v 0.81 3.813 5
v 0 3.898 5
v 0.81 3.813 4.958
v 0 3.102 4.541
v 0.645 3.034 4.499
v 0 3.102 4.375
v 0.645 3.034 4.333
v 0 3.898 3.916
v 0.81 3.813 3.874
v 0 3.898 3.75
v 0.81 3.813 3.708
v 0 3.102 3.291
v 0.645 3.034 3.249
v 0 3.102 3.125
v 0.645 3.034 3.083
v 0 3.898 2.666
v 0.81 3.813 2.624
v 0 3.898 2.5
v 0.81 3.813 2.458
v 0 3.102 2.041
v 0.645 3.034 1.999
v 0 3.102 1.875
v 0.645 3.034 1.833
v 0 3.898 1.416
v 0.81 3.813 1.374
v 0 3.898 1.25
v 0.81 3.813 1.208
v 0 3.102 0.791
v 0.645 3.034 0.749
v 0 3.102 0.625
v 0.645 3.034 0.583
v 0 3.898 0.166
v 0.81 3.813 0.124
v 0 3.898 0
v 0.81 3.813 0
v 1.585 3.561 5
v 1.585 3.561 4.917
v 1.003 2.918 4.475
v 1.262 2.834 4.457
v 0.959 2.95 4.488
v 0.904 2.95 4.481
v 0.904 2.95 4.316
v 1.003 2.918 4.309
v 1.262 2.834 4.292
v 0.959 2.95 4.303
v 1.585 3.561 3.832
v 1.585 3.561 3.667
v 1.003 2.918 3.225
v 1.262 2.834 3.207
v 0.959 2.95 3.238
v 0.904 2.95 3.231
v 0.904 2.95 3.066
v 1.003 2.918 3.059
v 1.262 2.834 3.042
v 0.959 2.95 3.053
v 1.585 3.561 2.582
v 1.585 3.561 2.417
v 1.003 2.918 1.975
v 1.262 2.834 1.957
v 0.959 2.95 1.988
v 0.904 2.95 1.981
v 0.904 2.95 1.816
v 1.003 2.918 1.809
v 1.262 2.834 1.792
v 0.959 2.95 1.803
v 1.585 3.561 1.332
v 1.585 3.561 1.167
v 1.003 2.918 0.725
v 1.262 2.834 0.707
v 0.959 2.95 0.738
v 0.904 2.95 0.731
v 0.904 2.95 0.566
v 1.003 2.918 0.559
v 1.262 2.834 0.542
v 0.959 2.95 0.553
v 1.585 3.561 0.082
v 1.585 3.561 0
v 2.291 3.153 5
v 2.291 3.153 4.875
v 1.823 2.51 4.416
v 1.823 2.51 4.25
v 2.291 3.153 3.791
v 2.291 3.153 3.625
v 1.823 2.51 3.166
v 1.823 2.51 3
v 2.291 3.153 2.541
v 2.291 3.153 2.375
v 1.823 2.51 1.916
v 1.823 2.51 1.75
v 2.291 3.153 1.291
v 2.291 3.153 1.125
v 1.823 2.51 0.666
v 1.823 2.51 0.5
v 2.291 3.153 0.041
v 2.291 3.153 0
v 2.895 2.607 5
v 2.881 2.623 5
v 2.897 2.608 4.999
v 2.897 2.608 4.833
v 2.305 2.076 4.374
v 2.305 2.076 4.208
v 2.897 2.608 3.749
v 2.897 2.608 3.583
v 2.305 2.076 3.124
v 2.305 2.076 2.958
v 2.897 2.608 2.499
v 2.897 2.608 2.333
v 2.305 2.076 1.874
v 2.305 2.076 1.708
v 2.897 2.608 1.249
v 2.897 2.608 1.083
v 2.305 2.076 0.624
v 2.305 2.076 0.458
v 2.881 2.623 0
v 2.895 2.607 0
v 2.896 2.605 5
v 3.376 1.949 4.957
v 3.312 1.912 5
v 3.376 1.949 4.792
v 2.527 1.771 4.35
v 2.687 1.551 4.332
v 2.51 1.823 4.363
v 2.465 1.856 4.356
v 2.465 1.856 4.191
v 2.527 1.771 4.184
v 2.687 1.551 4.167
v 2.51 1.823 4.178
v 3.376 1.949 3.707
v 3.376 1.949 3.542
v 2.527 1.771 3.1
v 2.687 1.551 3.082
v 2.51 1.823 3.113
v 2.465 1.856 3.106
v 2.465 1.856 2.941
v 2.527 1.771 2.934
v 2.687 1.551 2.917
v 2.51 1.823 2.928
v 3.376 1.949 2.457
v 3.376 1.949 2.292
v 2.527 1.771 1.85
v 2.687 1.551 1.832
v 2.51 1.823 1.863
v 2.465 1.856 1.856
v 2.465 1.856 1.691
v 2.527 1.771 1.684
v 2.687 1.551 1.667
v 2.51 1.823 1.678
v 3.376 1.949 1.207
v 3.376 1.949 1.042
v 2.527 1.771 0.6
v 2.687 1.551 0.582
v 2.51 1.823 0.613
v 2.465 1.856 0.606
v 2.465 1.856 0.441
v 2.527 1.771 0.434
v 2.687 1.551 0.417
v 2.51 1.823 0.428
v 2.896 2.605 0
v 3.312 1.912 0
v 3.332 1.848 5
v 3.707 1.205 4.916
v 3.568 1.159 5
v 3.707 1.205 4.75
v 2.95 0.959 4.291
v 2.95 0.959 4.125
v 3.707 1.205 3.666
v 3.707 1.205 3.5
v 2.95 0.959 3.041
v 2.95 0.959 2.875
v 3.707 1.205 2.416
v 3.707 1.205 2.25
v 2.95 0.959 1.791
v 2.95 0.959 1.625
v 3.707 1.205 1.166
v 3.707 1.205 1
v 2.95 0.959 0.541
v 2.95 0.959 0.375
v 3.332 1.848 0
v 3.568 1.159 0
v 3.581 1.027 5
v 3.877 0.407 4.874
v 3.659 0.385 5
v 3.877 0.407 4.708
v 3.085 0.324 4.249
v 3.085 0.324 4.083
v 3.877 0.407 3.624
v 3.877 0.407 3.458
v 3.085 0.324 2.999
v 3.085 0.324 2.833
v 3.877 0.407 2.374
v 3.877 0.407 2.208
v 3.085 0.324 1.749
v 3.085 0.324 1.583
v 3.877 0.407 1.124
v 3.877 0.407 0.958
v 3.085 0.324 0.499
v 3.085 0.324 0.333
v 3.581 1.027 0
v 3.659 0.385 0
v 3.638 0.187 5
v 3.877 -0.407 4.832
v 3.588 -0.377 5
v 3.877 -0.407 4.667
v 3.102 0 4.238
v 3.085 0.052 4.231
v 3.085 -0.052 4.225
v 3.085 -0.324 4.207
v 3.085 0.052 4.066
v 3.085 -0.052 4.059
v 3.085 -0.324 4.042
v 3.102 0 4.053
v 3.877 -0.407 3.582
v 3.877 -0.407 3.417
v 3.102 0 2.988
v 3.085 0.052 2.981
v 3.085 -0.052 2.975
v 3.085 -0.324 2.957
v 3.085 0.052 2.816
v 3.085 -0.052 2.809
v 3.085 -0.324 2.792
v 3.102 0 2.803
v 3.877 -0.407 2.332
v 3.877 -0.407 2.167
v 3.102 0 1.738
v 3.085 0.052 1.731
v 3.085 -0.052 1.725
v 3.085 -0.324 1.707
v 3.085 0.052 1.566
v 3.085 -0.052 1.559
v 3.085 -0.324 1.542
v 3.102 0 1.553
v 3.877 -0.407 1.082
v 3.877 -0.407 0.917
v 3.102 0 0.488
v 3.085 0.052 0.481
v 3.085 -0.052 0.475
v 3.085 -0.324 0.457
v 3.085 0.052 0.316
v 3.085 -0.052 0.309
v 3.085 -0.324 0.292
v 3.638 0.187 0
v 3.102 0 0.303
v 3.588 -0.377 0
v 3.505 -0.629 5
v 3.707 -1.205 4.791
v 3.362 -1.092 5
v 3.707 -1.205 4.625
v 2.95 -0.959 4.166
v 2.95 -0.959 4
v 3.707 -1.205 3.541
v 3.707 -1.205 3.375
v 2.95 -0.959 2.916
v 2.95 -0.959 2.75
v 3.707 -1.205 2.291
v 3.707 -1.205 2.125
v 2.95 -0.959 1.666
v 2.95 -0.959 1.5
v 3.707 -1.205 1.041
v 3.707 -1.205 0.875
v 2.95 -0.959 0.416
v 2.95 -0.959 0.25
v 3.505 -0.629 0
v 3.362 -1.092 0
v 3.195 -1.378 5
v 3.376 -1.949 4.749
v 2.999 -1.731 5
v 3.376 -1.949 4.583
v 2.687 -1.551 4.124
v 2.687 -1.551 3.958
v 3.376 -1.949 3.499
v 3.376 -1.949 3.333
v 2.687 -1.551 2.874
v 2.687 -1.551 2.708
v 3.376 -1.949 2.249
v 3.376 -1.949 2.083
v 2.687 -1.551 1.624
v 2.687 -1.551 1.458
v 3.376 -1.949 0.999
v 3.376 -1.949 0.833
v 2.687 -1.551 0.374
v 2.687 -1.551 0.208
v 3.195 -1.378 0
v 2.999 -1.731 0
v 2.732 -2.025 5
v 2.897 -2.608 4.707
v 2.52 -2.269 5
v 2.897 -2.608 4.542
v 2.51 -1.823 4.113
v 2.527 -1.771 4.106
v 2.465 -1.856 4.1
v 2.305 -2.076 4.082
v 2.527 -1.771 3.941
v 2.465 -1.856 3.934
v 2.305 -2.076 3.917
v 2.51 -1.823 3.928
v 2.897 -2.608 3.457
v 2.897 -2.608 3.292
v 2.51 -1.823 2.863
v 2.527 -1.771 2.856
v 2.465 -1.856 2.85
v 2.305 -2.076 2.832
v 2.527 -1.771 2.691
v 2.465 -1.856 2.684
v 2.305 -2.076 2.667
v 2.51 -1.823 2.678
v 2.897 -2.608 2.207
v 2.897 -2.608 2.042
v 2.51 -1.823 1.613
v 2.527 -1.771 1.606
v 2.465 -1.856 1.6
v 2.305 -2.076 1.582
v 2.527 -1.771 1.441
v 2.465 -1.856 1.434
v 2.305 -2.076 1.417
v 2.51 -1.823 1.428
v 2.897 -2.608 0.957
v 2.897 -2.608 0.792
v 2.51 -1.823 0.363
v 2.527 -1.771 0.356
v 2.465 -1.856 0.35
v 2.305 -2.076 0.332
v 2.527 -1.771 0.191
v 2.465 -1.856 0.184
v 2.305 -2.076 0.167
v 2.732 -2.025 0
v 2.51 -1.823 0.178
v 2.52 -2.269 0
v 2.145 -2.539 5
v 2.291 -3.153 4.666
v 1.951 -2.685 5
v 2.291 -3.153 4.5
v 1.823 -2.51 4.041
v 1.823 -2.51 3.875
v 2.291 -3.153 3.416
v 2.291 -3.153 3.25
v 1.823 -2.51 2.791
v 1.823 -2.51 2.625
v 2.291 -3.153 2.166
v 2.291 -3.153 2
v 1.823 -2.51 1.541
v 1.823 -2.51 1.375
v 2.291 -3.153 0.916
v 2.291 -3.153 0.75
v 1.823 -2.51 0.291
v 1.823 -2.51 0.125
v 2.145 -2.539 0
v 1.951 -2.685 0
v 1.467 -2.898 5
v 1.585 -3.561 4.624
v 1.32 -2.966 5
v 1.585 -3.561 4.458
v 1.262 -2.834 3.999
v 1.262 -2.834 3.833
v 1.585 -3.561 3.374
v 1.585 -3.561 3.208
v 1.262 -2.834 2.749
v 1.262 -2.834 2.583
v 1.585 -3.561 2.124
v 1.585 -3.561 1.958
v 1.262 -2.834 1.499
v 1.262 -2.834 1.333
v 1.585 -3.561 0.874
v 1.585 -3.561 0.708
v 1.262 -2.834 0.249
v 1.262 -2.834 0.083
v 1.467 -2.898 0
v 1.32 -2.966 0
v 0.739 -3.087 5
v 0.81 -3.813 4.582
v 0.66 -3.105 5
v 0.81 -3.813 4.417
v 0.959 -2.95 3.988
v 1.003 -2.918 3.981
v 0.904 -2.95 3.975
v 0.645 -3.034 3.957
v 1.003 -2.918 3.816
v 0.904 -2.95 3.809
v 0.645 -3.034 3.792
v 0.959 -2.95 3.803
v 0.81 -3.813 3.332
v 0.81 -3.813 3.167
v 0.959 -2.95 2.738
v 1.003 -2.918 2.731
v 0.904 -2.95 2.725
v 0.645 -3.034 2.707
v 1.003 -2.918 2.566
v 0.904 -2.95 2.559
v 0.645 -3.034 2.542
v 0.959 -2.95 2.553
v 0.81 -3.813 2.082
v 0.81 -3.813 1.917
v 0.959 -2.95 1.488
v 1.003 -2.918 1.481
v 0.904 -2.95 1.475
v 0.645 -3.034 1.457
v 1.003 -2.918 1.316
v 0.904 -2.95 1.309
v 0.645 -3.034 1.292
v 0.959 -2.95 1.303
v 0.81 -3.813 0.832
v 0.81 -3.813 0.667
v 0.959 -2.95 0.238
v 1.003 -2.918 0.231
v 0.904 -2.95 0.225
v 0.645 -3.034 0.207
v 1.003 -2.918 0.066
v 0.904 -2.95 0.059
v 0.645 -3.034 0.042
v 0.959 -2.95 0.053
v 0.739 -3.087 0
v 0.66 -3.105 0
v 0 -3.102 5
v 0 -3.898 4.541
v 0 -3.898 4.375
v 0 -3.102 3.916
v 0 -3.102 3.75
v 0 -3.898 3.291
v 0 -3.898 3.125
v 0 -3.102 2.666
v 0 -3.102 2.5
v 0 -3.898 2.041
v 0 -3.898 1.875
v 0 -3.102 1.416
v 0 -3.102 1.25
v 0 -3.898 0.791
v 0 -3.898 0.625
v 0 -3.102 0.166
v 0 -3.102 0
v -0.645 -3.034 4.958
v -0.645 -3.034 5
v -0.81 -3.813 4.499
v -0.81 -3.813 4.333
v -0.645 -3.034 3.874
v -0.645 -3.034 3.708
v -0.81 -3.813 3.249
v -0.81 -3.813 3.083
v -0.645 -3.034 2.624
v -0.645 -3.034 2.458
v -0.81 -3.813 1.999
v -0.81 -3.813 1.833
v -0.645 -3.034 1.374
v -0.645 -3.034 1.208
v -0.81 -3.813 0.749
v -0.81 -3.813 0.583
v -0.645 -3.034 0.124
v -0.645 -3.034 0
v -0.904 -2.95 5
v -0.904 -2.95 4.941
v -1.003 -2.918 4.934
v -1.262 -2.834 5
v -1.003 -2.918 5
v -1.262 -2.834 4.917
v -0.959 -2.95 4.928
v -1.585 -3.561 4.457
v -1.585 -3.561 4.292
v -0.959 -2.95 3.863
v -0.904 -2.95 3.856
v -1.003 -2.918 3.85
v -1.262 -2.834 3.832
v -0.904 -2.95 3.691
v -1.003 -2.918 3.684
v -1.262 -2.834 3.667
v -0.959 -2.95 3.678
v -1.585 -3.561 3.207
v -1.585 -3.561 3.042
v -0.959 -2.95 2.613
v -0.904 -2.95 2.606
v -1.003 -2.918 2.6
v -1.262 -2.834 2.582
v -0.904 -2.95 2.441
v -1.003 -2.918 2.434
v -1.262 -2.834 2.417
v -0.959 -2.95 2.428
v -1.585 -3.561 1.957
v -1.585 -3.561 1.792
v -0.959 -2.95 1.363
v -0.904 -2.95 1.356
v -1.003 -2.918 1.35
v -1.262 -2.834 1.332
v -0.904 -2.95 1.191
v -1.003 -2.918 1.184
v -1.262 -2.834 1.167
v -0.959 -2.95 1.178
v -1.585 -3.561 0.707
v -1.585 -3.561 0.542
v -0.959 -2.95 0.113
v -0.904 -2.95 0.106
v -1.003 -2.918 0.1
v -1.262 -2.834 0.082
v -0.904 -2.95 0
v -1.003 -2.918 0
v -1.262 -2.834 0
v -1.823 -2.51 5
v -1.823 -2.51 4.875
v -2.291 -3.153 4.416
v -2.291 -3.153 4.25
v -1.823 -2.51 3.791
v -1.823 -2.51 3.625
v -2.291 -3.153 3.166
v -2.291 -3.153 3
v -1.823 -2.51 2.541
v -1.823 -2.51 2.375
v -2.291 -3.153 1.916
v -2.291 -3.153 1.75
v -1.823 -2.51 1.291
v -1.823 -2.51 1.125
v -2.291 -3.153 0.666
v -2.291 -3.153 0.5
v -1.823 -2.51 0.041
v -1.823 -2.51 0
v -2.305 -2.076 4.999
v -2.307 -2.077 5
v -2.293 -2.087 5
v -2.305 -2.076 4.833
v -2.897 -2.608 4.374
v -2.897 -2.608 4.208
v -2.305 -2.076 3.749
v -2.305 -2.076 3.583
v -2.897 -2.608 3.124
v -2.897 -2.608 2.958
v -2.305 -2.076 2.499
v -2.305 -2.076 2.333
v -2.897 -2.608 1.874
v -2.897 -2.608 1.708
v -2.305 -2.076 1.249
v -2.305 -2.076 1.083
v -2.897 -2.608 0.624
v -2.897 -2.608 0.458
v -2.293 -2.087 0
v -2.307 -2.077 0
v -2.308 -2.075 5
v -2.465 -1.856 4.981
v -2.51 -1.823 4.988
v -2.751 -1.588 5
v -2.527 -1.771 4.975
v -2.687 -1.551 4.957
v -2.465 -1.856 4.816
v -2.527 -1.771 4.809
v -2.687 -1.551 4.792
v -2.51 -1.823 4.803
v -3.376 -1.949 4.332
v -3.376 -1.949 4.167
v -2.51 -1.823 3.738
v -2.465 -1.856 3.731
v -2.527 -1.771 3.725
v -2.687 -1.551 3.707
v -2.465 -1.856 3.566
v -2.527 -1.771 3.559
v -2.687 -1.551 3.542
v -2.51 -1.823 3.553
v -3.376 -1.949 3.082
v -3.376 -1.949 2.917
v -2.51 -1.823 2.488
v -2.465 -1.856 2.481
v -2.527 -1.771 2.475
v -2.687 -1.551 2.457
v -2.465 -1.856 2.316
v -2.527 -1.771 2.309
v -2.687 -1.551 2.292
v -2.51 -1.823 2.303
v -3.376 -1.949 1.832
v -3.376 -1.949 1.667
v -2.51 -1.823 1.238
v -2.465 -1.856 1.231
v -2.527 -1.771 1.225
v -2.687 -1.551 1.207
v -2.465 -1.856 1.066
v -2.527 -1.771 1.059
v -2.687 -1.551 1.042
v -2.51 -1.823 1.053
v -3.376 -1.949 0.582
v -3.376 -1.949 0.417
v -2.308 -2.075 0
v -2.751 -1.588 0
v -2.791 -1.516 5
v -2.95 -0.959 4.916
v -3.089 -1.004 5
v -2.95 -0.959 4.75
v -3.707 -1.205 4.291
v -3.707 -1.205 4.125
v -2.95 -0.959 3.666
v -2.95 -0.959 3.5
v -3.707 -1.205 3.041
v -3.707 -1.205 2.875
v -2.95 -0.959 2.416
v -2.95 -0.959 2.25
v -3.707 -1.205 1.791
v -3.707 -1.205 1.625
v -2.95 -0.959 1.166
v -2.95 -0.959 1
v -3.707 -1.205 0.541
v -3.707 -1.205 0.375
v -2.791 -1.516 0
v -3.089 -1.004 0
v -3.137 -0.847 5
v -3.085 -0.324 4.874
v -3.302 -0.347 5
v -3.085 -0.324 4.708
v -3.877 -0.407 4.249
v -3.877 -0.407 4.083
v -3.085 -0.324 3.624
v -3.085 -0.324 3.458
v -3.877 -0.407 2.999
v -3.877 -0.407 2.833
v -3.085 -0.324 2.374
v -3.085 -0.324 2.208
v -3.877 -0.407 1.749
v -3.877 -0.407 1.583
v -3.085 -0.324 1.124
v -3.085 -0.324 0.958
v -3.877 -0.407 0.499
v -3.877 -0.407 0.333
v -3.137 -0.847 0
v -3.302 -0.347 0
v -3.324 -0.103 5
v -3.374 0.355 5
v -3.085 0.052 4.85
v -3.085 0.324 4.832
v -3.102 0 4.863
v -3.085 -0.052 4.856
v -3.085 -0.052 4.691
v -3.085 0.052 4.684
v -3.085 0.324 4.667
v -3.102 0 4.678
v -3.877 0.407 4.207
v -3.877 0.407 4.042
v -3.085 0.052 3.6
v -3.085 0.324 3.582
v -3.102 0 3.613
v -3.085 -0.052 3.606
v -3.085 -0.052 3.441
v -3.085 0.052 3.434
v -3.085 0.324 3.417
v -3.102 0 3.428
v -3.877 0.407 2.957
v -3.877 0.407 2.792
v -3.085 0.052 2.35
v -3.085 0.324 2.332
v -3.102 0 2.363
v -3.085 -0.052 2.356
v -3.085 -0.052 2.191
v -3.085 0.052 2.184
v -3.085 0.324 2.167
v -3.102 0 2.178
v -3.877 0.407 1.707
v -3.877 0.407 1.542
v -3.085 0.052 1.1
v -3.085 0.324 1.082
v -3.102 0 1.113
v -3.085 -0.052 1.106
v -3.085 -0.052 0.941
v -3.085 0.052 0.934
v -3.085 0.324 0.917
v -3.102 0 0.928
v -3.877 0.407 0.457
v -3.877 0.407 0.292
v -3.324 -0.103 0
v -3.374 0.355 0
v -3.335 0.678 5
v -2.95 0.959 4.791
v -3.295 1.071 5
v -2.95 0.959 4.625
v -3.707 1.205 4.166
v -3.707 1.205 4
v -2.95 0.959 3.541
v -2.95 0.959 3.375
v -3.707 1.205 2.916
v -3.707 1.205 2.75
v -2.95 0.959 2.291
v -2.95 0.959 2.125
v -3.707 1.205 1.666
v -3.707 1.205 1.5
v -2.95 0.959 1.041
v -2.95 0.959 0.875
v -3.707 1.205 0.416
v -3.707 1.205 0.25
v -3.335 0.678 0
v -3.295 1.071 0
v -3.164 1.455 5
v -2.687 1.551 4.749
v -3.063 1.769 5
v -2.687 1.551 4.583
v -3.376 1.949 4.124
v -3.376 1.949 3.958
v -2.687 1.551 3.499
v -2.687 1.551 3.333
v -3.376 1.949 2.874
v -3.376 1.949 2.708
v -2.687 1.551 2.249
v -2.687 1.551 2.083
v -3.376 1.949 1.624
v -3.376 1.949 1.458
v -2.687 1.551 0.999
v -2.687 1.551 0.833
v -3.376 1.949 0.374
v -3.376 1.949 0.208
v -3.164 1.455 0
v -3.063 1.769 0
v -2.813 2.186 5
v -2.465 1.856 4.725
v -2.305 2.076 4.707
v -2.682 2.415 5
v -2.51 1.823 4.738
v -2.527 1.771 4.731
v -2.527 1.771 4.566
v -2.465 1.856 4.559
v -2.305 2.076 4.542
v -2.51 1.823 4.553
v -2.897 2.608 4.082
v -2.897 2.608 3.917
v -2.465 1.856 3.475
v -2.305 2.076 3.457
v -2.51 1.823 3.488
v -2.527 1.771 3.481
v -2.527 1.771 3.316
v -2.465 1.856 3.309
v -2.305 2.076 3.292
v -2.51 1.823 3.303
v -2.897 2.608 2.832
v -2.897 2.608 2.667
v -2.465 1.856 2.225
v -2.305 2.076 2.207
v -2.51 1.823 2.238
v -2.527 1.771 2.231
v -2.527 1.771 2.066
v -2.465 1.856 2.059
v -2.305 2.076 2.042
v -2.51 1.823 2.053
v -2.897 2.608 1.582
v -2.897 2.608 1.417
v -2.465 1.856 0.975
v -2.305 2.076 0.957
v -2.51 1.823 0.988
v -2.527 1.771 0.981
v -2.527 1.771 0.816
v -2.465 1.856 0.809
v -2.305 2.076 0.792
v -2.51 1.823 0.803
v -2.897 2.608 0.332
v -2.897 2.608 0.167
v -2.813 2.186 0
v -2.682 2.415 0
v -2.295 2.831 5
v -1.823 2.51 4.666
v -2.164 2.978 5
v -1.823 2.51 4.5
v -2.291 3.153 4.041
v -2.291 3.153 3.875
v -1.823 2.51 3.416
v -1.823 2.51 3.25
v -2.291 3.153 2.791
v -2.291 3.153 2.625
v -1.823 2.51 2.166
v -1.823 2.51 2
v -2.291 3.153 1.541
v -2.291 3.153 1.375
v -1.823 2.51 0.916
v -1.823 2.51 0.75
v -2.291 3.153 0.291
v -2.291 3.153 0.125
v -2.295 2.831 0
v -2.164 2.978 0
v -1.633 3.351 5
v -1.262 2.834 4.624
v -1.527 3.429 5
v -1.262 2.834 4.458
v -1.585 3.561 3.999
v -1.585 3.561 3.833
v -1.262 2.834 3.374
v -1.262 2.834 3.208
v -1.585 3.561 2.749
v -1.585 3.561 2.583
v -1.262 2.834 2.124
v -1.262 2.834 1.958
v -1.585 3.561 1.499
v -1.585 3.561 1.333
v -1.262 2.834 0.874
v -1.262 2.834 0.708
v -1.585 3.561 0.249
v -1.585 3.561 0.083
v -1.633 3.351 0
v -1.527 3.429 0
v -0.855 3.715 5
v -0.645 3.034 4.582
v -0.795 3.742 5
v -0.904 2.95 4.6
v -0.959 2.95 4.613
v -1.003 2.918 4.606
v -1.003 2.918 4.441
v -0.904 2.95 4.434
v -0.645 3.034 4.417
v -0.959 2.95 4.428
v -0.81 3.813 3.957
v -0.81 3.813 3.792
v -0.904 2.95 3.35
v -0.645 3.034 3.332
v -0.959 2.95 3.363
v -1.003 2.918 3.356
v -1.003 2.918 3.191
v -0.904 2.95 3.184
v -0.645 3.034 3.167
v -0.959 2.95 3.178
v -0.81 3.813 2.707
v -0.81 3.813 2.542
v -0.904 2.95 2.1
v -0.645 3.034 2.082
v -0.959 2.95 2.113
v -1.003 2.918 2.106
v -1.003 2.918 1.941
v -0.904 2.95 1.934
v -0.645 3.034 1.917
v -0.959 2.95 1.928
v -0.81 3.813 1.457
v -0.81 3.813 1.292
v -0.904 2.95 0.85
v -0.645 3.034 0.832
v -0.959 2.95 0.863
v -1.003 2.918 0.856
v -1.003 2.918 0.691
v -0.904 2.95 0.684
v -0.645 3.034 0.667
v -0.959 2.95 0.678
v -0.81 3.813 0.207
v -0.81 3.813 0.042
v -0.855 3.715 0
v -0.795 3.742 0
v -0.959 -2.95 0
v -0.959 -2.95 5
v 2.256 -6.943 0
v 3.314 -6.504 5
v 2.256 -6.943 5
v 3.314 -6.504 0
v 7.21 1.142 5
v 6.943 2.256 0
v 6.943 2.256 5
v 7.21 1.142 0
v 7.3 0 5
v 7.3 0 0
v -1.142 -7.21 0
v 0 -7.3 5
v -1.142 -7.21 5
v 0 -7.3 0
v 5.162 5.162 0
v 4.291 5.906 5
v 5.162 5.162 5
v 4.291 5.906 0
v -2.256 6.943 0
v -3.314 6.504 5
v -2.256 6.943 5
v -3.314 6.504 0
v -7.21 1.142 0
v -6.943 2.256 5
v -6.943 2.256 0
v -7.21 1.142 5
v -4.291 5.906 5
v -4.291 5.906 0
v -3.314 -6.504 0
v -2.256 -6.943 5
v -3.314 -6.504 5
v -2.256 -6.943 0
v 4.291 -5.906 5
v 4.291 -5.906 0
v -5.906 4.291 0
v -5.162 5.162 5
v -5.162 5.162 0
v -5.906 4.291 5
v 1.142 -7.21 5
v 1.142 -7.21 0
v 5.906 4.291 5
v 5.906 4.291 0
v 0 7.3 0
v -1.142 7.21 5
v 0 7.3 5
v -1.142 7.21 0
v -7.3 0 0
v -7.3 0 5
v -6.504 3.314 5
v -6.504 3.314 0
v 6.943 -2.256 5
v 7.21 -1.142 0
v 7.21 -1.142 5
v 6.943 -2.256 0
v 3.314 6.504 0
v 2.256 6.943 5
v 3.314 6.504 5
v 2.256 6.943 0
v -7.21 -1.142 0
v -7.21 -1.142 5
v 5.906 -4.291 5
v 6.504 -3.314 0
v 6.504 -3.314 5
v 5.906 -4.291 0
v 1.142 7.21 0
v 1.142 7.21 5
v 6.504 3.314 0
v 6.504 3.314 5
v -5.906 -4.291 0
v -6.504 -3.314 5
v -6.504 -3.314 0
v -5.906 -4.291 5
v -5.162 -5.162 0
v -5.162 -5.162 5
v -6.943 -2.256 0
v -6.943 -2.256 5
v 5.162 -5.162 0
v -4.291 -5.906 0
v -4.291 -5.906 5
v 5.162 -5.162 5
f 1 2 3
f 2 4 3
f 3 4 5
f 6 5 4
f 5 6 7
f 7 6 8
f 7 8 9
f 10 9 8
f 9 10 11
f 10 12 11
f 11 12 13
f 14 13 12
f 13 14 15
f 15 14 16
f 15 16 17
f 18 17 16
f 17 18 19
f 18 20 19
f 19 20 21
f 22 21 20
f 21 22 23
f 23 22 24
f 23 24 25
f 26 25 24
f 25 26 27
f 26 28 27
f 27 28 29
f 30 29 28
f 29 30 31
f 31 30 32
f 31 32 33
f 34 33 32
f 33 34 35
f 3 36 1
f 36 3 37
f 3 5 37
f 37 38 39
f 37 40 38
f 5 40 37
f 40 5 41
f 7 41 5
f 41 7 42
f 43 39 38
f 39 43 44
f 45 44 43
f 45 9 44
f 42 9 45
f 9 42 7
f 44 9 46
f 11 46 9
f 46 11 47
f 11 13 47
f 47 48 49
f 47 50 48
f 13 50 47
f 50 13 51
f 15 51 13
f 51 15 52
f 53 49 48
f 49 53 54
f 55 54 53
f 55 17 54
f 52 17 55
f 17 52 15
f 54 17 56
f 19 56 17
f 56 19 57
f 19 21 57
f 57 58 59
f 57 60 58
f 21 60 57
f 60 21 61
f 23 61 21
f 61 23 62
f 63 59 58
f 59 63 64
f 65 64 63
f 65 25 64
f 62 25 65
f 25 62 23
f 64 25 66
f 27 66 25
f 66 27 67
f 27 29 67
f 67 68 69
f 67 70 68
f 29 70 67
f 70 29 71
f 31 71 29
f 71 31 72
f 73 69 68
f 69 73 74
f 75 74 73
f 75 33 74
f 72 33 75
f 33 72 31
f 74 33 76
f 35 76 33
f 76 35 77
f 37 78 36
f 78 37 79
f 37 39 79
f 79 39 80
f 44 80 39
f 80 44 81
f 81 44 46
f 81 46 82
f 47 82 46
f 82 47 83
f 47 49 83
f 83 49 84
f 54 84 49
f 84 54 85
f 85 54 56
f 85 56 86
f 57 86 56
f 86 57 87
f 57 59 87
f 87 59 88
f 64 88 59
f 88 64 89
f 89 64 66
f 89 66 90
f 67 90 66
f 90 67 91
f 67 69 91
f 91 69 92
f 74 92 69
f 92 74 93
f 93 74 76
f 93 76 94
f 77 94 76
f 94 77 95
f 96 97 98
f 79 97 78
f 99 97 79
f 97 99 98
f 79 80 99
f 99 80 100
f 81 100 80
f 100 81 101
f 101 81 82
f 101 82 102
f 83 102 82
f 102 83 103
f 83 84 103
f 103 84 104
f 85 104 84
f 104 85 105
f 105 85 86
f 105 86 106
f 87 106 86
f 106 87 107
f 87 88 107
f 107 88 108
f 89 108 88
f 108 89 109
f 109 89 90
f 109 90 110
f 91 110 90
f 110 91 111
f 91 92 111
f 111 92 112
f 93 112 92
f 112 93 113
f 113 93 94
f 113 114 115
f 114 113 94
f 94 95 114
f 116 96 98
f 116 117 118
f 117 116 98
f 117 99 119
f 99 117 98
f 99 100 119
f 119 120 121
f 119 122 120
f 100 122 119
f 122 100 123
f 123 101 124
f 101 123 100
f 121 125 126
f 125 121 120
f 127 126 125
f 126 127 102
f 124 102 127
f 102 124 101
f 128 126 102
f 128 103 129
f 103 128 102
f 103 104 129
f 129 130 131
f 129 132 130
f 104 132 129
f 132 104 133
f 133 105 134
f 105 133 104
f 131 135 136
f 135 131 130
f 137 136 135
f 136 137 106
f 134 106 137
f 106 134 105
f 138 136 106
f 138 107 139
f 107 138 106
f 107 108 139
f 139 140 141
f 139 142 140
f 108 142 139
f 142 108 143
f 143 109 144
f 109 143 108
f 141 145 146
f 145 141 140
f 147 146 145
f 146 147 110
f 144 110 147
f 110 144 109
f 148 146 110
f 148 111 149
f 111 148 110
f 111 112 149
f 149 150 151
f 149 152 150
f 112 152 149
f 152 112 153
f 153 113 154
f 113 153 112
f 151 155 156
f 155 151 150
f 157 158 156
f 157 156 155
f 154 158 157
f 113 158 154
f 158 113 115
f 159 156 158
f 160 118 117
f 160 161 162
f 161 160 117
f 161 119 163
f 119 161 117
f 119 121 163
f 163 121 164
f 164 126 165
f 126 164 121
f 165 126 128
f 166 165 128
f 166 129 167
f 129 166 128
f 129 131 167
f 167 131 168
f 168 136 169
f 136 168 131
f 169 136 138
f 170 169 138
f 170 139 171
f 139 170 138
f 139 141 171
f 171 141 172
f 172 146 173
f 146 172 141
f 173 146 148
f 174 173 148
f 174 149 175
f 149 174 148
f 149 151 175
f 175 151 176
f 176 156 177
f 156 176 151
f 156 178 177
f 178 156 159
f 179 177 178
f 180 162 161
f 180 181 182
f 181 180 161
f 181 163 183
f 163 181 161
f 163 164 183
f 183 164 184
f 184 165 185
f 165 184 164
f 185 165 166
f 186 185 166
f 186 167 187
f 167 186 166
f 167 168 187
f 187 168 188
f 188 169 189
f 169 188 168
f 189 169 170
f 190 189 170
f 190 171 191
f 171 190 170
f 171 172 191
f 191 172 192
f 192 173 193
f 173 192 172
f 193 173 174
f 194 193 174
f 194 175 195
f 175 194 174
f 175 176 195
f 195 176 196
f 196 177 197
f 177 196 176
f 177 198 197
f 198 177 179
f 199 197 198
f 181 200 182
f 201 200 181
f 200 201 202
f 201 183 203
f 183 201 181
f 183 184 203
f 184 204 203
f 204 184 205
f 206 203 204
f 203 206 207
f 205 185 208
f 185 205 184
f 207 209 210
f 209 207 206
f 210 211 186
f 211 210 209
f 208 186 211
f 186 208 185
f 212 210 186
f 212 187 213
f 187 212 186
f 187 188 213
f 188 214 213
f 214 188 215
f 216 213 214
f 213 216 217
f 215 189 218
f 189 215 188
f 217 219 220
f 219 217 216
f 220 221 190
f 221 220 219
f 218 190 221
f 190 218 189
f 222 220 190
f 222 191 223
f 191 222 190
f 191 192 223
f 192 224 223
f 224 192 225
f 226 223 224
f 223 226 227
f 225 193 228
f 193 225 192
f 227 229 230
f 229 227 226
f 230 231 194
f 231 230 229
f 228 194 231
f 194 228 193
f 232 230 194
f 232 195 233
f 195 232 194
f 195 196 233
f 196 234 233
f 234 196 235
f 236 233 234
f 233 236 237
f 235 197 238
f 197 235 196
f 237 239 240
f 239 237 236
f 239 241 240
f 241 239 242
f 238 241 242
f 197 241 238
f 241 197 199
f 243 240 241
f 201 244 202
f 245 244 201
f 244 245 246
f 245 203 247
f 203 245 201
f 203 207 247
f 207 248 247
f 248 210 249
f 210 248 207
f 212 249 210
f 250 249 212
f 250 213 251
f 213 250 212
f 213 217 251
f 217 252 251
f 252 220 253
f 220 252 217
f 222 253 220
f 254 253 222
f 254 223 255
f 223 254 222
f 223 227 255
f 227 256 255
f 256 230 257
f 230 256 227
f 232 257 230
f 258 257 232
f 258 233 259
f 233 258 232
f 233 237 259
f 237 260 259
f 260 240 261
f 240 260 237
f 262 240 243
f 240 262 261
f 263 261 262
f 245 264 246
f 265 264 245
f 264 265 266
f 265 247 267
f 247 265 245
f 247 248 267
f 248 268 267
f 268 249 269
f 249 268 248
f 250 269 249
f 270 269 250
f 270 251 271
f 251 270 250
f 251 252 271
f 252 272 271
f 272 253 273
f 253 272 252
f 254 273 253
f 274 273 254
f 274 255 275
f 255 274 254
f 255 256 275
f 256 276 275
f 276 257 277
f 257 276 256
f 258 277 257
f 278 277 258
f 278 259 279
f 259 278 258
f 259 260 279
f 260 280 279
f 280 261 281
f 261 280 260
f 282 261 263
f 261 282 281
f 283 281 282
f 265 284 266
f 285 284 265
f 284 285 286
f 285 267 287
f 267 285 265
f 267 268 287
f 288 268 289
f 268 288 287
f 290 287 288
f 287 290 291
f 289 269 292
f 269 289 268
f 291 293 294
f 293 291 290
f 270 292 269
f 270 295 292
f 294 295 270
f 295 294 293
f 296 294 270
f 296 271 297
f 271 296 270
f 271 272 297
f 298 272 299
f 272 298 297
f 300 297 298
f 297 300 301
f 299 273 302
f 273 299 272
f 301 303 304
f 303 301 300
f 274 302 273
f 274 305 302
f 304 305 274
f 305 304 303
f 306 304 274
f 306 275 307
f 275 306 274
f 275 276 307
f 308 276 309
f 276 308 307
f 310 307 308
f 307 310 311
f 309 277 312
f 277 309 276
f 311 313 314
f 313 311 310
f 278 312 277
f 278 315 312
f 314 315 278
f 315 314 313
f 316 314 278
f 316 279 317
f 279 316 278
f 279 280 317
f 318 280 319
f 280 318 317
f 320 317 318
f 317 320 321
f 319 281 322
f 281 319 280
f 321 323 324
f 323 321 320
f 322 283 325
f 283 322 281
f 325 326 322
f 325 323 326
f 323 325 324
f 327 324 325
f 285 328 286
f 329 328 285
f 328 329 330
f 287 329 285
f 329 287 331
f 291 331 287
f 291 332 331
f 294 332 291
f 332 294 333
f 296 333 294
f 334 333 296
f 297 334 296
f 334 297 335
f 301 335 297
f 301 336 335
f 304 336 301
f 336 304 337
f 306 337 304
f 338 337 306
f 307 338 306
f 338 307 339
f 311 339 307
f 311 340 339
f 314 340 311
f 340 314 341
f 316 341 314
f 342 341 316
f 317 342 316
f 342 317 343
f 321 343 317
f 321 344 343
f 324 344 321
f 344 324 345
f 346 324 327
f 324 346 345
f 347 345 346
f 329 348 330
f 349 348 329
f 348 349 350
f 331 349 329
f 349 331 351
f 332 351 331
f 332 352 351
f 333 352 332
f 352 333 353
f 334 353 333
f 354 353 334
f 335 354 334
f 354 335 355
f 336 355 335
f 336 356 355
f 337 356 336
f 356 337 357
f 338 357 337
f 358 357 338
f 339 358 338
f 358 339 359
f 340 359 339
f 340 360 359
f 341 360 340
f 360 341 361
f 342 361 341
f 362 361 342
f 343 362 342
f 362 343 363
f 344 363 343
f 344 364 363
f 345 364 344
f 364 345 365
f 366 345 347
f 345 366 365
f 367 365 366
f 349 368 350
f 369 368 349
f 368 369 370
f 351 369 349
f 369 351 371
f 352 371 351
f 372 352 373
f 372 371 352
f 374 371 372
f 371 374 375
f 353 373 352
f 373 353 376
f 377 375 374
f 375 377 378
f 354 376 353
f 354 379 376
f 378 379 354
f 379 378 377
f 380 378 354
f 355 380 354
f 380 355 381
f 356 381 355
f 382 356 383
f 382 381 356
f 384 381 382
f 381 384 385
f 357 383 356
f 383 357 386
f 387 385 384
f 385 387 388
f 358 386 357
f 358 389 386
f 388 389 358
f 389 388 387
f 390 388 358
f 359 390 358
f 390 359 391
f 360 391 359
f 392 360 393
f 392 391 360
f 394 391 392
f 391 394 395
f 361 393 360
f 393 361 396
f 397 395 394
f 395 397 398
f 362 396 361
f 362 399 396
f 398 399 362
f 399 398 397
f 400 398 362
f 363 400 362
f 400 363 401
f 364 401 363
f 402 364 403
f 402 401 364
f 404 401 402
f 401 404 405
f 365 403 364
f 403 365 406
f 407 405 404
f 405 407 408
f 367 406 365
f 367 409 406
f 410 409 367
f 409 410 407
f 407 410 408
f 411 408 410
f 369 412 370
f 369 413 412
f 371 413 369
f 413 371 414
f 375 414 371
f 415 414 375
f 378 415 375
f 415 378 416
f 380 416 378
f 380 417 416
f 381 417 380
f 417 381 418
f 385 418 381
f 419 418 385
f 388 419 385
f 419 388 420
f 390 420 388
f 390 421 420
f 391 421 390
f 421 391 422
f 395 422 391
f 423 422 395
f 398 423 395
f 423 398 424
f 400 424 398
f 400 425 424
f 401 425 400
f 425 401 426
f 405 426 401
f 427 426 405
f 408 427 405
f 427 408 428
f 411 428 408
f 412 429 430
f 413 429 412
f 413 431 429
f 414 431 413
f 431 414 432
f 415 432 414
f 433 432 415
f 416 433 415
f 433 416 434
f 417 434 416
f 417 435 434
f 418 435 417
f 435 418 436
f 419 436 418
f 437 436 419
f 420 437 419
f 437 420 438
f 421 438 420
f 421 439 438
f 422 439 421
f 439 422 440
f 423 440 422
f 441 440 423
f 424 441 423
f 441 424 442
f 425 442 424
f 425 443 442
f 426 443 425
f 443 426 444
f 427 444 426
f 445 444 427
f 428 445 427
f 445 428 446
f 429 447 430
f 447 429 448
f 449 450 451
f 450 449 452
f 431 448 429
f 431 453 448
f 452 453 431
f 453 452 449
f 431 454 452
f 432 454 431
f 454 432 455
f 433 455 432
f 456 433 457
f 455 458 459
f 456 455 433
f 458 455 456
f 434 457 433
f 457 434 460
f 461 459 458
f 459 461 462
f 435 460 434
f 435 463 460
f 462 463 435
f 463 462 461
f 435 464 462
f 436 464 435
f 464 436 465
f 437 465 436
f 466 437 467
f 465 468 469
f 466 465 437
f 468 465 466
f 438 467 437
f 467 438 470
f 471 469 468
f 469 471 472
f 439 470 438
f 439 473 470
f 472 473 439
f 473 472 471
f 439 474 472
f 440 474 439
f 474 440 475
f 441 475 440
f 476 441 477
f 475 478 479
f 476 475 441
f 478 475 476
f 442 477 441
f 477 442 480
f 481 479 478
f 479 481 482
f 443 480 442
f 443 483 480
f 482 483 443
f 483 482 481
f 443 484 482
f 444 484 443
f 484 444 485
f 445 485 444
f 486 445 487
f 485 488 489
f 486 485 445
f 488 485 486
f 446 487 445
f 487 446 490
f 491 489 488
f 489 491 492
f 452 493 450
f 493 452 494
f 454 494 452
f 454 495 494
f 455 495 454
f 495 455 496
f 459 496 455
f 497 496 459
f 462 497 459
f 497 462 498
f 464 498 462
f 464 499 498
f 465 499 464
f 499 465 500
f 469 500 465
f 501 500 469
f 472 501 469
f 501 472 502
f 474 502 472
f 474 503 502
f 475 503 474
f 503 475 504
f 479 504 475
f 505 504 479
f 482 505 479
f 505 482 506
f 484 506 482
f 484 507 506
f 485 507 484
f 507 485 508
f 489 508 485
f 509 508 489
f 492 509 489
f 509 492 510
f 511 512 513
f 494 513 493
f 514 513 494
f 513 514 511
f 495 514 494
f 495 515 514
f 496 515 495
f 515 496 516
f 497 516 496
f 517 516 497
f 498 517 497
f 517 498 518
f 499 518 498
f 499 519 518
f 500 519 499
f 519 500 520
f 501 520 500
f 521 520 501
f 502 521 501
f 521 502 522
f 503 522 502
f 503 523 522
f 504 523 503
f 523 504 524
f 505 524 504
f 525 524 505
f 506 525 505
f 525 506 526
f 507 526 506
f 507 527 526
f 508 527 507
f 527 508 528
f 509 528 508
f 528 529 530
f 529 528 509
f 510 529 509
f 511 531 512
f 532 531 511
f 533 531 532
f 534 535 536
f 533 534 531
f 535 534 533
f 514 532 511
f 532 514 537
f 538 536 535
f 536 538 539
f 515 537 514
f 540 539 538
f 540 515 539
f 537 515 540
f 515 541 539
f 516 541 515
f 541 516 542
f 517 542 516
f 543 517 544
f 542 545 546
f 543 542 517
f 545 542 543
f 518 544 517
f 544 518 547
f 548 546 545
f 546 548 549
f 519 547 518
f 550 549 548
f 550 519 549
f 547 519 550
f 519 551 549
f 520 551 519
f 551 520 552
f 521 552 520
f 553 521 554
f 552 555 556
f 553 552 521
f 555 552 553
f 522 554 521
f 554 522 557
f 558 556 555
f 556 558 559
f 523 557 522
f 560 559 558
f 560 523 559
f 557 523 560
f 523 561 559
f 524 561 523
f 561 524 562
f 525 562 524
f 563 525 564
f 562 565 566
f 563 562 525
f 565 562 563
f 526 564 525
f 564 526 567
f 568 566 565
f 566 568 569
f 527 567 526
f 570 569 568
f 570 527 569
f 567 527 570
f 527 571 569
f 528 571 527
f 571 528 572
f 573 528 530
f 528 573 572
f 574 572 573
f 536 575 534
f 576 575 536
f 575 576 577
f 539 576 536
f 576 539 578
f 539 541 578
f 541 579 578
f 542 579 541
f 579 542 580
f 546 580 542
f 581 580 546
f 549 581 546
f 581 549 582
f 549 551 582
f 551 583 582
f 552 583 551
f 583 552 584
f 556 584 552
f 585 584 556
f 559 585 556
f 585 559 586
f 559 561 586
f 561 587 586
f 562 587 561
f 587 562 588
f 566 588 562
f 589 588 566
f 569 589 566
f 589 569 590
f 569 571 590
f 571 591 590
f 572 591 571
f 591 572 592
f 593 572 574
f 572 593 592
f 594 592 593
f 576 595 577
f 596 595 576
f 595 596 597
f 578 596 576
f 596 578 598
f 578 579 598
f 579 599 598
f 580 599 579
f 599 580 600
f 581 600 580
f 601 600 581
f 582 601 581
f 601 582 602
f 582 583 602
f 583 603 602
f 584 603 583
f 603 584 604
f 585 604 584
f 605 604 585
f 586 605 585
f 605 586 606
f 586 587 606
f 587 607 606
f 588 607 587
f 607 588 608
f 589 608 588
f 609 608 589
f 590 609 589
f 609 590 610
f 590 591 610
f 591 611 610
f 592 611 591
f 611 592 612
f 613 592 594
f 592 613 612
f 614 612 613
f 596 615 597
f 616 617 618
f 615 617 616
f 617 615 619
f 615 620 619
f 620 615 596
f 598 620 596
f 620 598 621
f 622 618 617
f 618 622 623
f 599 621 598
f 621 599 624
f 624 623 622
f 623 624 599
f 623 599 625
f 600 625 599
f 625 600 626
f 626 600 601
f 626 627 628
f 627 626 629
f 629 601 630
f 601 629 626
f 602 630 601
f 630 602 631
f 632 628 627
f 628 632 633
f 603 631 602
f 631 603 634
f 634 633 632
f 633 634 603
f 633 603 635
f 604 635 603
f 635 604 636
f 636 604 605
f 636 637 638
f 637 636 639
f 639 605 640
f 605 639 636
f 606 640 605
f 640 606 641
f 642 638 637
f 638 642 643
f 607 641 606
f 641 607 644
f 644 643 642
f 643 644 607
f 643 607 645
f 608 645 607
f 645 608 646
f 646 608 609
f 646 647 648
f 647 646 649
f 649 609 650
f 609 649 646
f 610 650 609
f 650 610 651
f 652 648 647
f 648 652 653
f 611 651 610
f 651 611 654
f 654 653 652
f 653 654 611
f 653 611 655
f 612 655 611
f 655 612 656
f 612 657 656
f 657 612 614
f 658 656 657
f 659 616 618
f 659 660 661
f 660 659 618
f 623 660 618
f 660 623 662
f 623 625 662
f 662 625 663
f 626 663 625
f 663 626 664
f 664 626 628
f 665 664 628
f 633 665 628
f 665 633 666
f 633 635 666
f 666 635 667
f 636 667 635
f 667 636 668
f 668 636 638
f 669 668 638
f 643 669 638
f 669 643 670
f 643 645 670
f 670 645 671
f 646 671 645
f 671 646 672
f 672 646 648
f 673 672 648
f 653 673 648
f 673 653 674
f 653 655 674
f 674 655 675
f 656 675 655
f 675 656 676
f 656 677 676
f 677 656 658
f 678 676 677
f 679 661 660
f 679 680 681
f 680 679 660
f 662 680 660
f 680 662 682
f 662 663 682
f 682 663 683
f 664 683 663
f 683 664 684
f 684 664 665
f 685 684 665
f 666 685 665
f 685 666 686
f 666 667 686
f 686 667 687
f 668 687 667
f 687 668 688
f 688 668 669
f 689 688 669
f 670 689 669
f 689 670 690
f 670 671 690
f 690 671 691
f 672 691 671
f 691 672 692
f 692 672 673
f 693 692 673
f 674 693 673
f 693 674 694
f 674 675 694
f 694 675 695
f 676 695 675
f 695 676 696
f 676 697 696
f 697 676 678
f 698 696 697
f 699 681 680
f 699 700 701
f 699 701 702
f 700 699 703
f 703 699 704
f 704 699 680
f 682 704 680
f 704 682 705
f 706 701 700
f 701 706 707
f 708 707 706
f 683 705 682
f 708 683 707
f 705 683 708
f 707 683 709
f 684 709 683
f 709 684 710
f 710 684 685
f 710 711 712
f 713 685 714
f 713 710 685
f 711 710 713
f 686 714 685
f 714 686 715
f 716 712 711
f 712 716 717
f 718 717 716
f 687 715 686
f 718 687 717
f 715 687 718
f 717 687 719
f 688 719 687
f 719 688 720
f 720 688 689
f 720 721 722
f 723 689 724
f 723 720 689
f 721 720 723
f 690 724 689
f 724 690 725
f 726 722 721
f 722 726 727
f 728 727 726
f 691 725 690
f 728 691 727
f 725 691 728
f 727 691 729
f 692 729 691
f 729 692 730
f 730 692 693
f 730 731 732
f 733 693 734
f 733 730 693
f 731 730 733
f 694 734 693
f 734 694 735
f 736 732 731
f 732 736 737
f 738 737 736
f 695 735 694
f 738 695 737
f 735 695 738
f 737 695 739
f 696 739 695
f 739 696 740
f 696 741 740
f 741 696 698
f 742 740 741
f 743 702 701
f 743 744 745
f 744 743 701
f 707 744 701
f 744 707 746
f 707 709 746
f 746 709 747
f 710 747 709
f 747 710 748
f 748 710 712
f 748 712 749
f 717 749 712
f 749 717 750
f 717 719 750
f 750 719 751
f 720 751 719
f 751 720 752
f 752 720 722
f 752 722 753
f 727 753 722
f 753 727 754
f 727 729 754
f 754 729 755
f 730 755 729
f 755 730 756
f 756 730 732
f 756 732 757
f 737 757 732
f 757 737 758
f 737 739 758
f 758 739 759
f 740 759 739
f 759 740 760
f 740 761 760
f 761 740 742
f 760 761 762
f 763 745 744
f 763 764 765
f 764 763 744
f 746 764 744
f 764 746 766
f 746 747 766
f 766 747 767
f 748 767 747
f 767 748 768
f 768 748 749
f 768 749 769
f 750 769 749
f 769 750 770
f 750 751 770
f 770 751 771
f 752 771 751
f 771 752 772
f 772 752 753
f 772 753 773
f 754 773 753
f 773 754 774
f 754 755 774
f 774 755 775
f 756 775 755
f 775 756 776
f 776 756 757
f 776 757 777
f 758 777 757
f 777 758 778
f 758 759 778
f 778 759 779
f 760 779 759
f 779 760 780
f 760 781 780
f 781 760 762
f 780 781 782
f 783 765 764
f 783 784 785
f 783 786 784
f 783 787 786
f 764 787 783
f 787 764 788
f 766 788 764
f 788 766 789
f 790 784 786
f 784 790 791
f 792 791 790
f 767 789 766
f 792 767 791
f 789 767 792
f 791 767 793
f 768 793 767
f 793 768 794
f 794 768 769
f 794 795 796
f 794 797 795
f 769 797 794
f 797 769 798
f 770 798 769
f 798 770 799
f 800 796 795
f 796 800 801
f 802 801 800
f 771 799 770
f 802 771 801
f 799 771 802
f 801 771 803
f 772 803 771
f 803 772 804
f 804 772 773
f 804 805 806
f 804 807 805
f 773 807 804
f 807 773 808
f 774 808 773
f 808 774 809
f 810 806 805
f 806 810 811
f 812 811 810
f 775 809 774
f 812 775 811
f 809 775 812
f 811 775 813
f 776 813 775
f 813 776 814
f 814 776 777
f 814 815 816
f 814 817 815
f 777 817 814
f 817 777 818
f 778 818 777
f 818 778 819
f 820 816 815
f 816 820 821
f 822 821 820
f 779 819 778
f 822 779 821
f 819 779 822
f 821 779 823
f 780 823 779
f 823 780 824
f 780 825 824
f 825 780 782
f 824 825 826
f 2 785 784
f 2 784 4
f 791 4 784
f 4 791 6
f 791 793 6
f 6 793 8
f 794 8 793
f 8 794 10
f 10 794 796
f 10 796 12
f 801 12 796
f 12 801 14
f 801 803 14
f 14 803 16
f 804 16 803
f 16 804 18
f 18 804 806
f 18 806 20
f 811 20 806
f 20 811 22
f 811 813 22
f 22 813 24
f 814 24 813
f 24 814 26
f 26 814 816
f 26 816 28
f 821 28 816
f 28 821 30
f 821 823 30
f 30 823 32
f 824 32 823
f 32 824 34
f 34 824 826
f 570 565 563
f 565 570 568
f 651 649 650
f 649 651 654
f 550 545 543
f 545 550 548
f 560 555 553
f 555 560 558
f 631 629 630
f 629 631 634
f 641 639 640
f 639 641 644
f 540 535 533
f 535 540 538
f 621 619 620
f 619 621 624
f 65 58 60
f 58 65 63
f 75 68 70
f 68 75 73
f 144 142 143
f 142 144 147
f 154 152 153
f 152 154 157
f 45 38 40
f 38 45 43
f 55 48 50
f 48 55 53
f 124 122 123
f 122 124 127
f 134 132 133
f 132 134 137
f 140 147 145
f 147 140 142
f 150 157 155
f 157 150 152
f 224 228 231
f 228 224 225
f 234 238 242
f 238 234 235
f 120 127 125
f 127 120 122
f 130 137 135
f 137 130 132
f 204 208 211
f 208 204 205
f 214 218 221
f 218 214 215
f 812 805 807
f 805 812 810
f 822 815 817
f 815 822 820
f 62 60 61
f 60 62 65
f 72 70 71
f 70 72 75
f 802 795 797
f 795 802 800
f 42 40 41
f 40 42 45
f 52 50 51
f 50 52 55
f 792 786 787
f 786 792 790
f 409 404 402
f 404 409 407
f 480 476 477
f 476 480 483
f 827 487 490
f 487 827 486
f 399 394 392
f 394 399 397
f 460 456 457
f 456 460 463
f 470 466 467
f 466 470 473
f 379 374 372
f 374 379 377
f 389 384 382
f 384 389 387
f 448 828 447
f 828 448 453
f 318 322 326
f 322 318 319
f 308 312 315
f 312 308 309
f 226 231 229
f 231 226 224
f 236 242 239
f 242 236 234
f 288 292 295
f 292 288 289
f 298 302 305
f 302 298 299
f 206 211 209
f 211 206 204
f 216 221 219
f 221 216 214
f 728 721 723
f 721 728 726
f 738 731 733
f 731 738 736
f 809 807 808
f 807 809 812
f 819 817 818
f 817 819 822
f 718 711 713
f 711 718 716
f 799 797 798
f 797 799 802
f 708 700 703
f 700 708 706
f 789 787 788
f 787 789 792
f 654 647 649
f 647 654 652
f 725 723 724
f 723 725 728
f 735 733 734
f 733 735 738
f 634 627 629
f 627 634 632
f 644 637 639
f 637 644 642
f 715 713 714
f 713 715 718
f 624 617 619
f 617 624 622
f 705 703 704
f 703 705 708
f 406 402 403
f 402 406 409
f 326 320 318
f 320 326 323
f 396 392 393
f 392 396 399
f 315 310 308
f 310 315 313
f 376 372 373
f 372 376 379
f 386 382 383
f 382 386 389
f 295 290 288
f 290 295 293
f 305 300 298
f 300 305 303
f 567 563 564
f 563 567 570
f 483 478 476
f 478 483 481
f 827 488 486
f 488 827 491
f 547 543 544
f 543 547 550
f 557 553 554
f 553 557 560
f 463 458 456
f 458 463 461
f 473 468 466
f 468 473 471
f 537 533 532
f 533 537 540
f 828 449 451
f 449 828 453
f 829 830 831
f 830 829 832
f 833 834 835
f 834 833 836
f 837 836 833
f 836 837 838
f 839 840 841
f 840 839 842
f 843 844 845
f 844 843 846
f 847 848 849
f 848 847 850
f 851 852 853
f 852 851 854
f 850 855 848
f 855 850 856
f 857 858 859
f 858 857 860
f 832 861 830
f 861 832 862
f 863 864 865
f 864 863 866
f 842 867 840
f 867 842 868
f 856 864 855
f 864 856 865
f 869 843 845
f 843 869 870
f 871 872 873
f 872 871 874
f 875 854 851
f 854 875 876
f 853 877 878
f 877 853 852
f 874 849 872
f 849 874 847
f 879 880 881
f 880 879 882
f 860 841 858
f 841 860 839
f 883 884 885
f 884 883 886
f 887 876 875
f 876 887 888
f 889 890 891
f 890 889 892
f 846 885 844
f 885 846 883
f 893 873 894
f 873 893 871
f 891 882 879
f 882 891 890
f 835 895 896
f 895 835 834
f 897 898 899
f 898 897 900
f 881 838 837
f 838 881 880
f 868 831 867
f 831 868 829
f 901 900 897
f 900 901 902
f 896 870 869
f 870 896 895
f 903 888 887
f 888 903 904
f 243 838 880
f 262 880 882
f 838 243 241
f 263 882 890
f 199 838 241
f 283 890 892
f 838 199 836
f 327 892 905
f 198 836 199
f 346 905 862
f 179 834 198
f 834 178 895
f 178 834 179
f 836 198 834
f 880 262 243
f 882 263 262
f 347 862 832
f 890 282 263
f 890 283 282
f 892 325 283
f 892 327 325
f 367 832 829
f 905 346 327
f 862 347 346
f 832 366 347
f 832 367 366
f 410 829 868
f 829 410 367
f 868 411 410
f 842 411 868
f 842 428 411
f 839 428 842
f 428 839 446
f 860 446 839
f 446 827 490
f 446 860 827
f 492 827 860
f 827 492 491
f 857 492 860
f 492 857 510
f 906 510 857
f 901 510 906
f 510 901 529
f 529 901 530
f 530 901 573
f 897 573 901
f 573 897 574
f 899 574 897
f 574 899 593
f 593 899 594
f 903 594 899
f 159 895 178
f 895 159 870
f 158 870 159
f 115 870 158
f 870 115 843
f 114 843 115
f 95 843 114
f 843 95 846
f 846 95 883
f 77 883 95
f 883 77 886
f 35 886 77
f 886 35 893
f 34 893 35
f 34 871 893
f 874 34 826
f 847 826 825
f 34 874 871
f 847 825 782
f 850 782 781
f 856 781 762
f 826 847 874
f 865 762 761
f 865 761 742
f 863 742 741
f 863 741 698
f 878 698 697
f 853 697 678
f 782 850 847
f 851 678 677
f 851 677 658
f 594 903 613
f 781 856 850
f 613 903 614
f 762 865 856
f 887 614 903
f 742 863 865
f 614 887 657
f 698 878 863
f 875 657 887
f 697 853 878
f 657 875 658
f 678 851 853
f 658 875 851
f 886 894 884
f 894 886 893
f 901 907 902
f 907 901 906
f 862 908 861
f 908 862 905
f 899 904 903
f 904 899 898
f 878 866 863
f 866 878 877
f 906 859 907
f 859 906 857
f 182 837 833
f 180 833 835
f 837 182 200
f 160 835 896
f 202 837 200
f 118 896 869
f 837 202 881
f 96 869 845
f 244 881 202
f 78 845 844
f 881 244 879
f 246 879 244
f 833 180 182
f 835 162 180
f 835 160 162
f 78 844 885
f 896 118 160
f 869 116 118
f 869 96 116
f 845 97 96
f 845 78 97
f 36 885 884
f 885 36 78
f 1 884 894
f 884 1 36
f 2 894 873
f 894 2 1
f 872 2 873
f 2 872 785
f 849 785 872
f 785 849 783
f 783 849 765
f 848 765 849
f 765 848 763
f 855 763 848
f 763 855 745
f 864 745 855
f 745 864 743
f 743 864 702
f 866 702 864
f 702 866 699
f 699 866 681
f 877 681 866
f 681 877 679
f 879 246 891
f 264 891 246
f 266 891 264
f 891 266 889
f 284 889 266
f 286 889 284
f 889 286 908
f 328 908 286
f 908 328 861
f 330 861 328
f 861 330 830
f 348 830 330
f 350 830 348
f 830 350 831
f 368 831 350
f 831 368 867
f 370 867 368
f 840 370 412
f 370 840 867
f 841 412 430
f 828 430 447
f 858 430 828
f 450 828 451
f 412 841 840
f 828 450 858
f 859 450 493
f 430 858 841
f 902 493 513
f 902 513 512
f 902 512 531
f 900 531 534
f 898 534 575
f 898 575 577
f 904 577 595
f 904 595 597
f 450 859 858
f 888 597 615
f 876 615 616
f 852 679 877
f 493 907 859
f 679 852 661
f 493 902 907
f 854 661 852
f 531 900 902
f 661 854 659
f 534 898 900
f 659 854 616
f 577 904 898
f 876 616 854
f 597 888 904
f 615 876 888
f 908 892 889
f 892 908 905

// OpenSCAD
// Threading.scad - library for threadings
// Autor: Rudolf Huttary, Berlin 2016 

use <Naca_sweep.scad> // http://www.thingiverse.com/thing:900137

// examples 
showexample = 10;   // choose your example number

example(showexample)
{
// #1 ACME thread
  threading(pitch = 2, d=20, windings = 5, angle = 29); 

// #2 threaded rod 20°
  threading(pitch = 2, d=20, windings = 30, angle = 20, full = true); 

// #3 nut for threaded rod 20°
  Threading(pitch = 2, d=20, windings = 10, angle = 20); 

// #4 nut for threaded rod 20°, own diameter 25 mm, hires 
  Threading(D = 25, pitch = 2, d=20, windings = 10, angle = 20, $fn=100); 

// #5 triple helix threaded rod
  threading(pitch = 2, d=20, windings = 30, helices = 3, angle = 20, full = true); 

// #6 toothed rod (no pitch) 
   threading(helices = 0, angle = 20, full = true); 

// #7 toothed cube (no pitch) 
   threading(helices = 0, angle = 60, full = true, $fn=4); 

// #8 M8 hex bolt
   union(){
     threading(pitch = 1.25, d=8, windings=20, full=true); cylinder(d=14.6, h=4, $fn=6);} 
// #9 M8 hex bolt - left hand thread
   union(){
     threading(pitch = 1.25, d=8, windings=20, full=true, left = true); cylinder(d=14.6, h=4, $fn=6);} 
// #10 M8 hex nut
   Threading(D=14.6, pitch = 1.25, d=8, windings=5);  
// #11 M8 four socket nut
   Threading(D=16, pitch = 1.25, d=8, windings=5, edges=4);  
}

module example(number=0) 
{ 
  if(number>0 && number<=$children) children(number-1);
    help(); 
}

module help_Threading() help(); 
module help_threading() help(); 

module help()
{
  helpstr = 
  "<h4>Thread library - by Rudolf Huttary (2016)</h4> 
    <h5>modules</h5>
    &nbsp;help();        <i> show help in console</i><br>
    &nbsp;threading(pitch = 1, d = 6, windings = 10, helices = 1, angle = 60, edges=40, full = false, left = false); <br>
    &nbsp;Threading(D = 0, pitch = 1, r = 6, windings = 10, helices = 1, angle = 60, left = false); 
    <h5>parameters</h5>
    &nbsp;D = {0=auto};   <i>Cyl diameter Threading()</i><br>
    &nbsp;d = 6;         <i> outer diameter thread()</i><br>
    &nbsp;windings = 10; <i> number of windings</i><br>
    &nbsp;helices = 1;   <i> number of threads</i><br>
    &nbsp;angle = 60;    <i> open angle, bolts: 60°, ACME: 29°, toothed Racks: 20°</i><br>
    &nbsp;edges = 40;    <i> resolution of outer cylinder </i><br>
    &nbsp;left = false;  <i> left handed threading </i><br>  
    &nbsp;$fn = 360/$fa; <i> segments per winding</i><br>  
    ";
  echo (helpstr);
}

//Threading(R=12, pitch = pitch, r=radius, windings= windings, angle = angle); 

module Threading(D = 0, pitch = 1, d = 12, windings = 10, helices = 1, angle = 60, edges=40, left = false)
{
  R = D==0?d/2+pitch/PI:D/2; 
  translate([0,0,-pitch])
  difference()
  { 
    translate([0,0,pitch]) 
    cylinder (r=R, h =pitch*(windings-helices), $fn = edges); 
    threading(pitch, d, windings, helices, angle, true, left, $fn = $fn); 
  }
}

module threading(pitch = 1, d = 12, windings = 10, helices = 1, angle = 60, full = false, left=false)
{  // tricky: glue two 180° pieces together to get a proper manifold  
  r = d/2;
  ccw = left?1:-1; 
  Steps = $fn?$fn/2:180/$fa; 
  Pitch = pitch*helices; 
  if(full) cylinder(r = r-.5-pitch/PI, h=pitch*(windings+helices), $fn=$fn); 
  translate([0,0,(helices*.5+windings)*pitch]) 
  {
    sweep(gen_dat());   // half screw
    rotate([0, 0, 180]) translate([0, 0, Pitch/2])
    sweep(gen_dat());   // half screw
  }
  function gen_dat() = let(ang = 180, bar = R_(180, -90, 0, Ty_(-r+.5, vec3D(pitch/PI* Rack(windings, angle)))))
        [for (i=[0:Steps]) Tz_(-i/2/Steps*Pitch, Rz_(ccw*i*ang/Steps, bar))]; 

  function Rack(w, angle) = 
     concat([[0, 2]], 
            [for (i=[0:windings-1], j=[0:3]) 
              let(t = [ [0, 1], [2*tan(angle/2), -1], [PI/2, -1], [2*tan(angle/2)+PI/2, 1]])
              [t[j][0]+i*PI, t[j][1]]], [[w*PI, 1], [w*PI, 2]]);
     
  function rev(L) = let(N=len(L)) [for(x = [1:N]) x[N-i]];  
//    function rev(L) = L;
}
